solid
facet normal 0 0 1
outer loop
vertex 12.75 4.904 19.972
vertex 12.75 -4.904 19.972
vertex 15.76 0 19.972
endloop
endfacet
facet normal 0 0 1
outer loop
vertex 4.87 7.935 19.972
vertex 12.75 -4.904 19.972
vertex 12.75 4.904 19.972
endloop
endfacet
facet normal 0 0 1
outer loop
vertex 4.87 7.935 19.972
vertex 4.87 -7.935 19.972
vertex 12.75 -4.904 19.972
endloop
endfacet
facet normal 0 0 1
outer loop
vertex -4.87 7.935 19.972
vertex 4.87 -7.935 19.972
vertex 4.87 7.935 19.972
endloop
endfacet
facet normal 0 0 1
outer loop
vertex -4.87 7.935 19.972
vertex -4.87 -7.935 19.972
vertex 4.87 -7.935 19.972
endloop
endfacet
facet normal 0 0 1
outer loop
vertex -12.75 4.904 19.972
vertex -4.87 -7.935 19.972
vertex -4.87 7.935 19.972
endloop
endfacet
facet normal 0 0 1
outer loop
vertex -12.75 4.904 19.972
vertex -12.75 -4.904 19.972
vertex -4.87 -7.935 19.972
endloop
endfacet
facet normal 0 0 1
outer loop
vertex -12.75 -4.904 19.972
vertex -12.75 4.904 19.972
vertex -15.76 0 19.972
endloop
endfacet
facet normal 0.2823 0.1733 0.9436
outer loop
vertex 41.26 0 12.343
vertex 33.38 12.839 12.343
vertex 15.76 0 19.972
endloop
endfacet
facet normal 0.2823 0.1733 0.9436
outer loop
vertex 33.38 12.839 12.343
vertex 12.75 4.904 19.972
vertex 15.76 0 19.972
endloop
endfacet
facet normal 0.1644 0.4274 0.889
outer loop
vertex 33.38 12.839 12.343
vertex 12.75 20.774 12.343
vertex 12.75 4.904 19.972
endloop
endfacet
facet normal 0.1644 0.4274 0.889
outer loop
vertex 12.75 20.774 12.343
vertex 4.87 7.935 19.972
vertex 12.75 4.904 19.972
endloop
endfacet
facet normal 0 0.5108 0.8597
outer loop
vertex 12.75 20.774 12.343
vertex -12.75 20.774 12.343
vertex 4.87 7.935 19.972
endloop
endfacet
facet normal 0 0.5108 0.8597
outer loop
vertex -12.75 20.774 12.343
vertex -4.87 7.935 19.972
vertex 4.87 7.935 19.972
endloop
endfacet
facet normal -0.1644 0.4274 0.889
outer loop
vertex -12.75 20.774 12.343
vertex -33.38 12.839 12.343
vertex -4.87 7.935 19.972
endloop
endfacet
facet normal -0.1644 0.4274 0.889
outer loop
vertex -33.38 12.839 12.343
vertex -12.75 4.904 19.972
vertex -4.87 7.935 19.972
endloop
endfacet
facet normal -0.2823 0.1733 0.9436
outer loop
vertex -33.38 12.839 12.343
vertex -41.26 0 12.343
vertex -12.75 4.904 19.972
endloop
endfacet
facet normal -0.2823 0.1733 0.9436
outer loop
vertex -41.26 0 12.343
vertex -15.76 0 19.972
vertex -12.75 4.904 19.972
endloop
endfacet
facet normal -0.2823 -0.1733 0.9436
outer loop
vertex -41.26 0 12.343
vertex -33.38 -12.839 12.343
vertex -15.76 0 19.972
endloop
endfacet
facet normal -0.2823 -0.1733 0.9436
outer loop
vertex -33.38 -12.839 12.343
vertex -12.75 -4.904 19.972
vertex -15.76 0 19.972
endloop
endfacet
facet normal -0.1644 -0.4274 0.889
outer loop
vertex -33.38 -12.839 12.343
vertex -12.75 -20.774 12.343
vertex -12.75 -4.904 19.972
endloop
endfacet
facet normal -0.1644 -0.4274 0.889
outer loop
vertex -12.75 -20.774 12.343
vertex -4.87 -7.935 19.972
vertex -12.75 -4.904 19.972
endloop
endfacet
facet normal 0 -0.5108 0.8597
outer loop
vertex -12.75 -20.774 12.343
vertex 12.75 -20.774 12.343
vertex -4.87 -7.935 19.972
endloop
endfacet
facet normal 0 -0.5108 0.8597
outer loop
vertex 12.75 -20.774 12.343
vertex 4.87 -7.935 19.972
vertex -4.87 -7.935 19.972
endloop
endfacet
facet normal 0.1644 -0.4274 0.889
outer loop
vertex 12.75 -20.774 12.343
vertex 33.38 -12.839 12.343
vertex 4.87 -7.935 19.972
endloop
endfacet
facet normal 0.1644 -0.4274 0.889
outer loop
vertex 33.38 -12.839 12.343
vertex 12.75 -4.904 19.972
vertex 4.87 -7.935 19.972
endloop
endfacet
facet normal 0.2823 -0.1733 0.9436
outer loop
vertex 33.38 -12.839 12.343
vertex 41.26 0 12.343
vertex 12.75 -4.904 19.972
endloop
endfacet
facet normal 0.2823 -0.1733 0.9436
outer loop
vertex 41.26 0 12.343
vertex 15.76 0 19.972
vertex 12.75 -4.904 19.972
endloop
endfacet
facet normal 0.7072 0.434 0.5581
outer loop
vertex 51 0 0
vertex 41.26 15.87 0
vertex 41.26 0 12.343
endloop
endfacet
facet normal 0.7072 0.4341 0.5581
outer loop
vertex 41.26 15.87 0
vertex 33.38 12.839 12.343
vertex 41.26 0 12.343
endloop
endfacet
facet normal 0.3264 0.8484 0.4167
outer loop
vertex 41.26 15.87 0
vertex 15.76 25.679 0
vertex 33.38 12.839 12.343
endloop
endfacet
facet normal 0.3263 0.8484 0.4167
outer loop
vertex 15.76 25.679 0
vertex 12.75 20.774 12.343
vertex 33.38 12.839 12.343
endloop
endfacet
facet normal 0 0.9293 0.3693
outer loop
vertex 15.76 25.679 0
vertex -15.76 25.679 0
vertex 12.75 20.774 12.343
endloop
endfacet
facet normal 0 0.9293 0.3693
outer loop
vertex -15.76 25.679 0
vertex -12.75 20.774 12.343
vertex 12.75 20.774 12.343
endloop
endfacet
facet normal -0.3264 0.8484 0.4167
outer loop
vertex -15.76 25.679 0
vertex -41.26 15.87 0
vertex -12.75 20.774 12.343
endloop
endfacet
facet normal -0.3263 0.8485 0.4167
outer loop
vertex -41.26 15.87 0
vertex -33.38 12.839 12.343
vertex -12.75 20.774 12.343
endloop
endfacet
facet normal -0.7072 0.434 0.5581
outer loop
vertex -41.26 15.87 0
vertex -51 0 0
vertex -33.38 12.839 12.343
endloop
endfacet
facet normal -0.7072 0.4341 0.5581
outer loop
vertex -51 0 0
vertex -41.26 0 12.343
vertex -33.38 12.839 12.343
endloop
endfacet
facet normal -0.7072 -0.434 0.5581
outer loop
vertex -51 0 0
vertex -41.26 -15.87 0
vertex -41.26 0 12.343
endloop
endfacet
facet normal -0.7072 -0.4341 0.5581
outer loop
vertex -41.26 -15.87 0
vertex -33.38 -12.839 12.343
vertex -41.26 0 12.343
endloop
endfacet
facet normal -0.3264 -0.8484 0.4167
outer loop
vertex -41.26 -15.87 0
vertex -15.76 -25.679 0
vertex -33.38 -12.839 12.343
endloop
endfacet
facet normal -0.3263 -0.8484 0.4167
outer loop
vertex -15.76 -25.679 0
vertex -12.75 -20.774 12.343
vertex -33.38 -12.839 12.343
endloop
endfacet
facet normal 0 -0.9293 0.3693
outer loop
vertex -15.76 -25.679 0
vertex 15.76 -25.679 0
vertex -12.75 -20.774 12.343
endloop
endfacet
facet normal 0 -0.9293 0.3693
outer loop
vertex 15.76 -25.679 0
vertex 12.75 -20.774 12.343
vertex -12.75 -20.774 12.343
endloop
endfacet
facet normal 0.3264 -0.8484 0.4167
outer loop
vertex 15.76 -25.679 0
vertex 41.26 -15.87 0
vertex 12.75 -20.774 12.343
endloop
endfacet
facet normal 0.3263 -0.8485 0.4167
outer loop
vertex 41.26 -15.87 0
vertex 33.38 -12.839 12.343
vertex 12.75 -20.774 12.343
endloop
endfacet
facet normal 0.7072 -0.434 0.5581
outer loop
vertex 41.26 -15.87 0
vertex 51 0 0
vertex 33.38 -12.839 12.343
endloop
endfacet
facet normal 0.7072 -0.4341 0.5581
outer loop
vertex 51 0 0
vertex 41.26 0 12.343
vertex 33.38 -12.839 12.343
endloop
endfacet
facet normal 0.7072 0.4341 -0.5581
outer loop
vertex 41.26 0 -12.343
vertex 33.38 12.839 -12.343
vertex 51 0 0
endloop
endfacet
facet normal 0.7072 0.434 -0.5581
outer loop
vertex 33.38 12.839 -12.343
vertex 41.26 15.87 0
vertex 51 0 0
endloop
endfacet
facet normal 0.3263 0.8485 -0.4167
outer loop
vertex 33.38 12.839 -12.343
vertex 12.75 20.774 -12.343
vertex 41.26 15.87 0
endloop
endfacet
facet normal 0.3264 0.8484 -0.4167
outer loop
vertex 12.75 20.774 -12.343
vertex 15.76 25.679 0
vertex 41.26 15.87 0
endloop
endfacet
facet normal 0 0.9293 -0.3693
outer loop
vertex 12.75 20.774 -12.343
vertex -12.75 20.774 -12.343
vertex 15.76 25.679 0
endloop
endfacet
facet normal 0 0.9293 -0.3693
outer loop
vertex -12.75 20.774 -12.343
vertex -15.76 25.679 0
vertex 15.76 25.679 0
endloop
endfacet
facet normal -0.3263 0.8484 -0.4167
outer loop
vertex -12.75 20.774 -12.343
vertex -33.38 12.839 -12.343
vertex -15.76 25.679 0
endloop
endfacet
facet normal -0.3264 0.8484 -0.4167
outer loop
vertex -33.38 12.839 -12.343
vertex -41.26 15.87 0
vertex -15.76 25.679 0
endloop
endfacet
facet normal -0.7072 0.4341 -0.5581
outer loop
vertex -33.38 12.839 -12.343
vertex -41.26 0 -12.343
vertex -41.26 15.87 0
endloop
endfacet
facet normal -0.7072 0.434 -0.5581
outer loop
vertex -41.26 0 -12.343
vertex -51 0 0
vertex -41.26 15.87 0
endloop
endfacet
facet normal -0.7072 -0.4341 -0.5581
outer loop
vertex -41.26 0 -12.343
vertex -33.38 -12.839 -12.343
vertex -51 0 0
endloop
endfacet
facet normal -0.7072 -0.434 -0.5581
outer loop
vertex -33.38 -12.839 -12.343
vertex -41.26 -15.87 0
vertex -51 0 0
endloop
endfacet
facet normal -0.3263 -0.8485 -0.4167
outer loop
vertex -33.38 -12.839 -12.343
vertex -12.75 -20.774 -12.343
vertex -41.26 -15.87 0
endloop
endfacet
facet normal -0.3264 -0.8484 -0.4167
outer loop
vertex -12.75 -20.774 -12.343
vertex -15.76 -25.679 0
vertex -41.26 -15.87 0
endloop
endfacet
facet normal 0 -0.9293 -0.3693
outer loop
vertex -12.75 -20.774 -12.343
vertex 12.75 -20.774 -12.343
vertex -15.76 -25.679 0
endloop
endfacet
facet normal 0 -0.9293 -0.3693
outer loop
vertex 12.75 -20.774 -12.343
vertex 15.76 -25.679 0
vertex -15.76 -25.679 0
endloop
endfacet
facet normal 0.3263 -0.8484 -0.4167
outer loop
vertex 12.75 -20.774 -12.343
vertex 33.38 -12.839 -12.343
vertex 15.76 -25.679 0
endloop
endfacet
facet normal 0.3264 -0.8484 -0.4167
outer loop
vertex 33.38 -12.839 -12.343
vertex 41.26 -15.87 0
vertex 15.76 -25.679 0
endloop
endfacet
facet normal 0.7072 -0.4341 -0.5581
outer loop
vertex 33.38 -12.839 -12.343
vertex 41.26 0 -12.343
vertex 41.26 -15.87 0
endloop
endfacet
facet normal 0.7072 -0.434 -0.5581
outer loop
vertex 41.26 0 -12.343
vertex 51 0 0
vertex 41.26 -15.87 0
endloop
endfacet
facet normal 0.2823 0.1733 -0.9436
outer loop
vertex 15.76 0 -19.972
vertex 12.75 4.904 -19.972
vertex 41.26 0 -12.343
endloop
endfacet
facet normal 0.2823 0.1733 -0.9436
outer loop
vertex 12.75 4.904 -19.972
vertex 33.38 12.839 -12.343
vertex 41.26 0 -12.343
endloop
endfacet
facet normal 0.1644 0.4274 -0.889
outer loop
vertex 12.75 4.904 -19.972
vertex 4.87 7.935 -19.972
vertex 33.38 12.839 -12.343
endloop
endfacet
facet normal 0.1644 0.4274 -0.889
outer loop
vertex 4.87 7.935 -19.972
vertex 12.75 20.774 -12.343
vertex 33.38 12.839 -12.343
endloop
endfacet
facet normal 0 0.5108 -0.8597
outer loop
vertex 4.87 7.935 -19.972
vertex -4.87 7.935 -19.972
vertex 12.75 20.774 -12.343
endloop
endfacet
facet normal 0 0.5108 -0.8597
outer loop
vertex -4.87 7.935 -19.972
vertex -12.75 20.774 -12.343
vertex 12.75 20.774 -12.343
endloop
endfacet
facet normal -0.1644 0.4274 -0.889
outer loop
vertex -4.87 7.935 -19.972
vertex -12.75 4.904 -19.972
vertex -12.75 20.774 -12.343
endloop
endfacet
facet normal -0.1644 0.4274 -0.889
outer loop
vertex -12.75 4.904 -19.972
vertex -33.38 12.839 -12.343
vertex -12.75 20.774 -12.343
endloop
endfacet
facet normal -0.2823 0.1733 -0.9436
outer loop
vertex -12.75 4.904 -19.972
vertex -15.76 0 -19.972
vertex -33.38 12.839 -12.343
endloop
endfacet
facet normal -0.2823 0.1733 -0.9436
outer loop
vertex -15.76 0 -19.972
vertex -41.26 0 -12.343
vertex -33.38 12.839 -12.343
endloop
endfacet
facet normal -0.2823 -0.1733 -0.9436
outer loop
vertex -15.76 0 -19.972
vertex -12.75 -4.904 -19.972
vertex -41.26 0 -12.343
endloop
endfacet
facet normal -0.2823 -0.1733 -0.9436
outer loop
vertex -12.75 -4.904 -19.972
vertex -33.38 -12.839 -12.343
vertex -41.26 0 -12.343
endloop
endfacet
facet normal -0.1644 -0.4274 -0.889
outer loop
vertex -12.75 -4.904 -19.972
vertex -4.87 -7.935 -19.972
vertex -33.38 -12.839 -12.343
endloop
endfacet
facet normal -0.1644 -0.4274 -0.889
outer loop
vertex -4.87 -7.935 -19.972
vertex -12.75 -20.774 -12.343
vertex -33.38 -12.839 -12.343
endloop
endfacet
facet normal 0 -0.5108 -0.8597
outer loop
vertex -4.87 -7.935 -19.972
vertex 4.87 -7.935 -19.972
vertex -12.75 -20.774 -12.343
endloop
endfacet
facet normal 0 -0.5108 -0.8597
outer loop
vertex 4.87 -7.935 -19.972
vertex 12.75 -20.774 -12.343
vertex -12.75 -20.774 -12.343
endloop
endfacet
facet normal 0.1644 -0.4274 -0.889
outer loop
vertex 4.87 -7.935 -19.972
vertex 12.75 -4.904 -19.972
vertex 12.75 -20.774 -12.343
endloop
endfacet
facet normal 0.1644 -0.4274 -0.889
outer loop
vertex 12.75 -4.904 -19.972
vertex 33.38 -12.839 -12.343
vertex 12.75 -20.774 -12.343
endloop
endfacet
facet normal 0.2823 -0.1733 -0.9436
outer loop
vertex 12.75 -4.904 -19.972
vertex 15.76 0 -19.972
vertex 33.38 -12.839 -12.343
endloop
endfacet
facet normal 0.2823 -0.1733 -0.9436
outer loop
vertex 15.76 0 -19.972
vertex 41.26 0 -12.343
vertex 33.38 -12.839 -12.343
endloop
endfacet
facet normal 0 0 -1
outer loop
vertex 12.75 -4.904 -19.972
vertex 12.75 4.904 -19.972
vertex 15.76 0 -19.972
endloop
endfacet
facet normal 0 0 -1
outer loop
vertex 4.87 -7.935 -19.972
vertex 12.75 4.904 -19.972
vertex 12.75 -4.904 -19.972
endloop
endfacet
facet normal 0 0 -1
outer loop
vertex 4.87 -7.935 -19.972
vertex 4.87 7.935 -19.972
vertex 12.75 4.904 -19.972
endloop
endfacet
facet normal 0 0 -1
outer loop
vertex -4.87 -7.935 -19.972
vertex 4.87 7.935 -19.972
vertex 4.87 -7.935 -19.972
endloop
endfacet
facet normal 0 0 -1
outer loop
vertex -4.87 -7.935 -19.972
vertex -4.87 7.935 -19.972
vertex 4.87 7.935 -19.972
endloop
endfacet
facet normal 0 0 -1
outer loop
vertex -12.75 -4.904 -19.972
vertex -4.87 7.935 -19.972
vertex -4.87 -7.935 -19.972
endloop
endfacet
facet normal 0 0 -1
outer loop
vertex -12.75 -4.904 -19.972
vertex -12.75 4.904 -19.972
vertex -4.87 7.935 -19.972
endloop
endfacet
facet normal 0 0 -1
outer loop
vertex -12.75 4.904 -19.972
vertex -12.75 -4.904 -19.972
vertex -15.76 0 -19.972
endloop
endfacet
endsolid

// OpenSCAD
// Generated by SolidPython 1.0.1 on 2020-07-29 00:46:53


scale(v = [17, 9, 7]) {
	sphere(r = 3);
}
/***********************************************
*********      SolidPython code:      **********
************************************************
 
# import packages: SolidPython
from solid import *
from solid.utils import *
from itertools import chain, combinations, permutations


class Resize:

    def __init__(self, scad_file):
        self.scad_file = scad_file
        #self.scad_file = import_scad(scad_file)
        # cone/cylinder param:
        self.r1 = 0
        self.r2 = 0
        self.h = 0
        # rectangular prism param:
        self.w = 0
        self.l = 0
        # ellipse param:
        self.r = 0

    # import OpenScad code (file name corresponds to shape)


    # classify shape + parameters
    def assign(self, param1, param2, param3):
        if self.scad_file == 'cone.scad':
            self.r1 = param1
            self.r2 = param2
            self.h = param3
        elif self.scad_file == 'cylinder.scad':
            self.r1 = param1
            self.r2 = param2
            self.h = param3
        elif self.scad_file == 'rectangularPrism.scad':
            self.h = param1
            self.l = param2
            self.w = param3
        else:
            self.r = param1
            self.h = param2

    # resize parameters
    def iterate(self):
        x = range(3, 20, 2)
        i = 1
        if self.scad_file == 'cone.scad':
            tempList = list(permutations(x, 2))
            for temp in tempList:
                param1 = temp[0]
                param2 = temp[1]
                filepath = 'produced_scad_files/' + 'cone' + str(param1) + '_' + str(param2) + '_' + '.scad'
                scad_render_to_file(cylinder(h=param1, r1=param2, r2=0), filepath)

        elif self.scad_file == 'cylinder.scad':
            tempList = list(permutations(x, 3))
            for temp in tempList:
                param1 = temp[0]
                param2 = temp[1]
                filepath = 'produced_scad_files/' + 'cylinder' + str(param1) + '_' + str(param2) + '_' + '.scad'
                scad_render_to_file(cylinder(h=param1, r1=param2, r2=param2), filepath)

        elif self.scad_file == 'rectangularPrism.scad':
            tempList = list(permutations(x, 3))
            for temp in tempList:
                param1 = temp[0]
                param2 = temp[1]
                param3 = temp[2]
                filepath = 'produced_scad_files/' + 'rectangularPrism' + str(param1) + '_' + str(param2) + '_' + str(
                    param3) + '.scad'
                scad_render_to_file(cube(size=(param1, param2, param3)), filepath)

        elif self.scad_file == 'ellipse.scad':
            tempList = list(permutations(x, 4))
            for temp in tempList:
                param1 = temp[0]
                param2 = temp[1]
                param3 = temp[2]
                param4 = temp[3]
                filepath = 'produced_scad_files/' + 'ellipse' + str(param1) + '_' + str(param2) + '_' + str(param3) + '_' + str(param4) + '.scad'
                scad_render_to_file(scale([param1, param2, param3])(sphere(r=param4)), filepath)

    def render_to_scadfile(self):
        scad_render_to_file(scad, 'example.scad') 
 
************************************************/
